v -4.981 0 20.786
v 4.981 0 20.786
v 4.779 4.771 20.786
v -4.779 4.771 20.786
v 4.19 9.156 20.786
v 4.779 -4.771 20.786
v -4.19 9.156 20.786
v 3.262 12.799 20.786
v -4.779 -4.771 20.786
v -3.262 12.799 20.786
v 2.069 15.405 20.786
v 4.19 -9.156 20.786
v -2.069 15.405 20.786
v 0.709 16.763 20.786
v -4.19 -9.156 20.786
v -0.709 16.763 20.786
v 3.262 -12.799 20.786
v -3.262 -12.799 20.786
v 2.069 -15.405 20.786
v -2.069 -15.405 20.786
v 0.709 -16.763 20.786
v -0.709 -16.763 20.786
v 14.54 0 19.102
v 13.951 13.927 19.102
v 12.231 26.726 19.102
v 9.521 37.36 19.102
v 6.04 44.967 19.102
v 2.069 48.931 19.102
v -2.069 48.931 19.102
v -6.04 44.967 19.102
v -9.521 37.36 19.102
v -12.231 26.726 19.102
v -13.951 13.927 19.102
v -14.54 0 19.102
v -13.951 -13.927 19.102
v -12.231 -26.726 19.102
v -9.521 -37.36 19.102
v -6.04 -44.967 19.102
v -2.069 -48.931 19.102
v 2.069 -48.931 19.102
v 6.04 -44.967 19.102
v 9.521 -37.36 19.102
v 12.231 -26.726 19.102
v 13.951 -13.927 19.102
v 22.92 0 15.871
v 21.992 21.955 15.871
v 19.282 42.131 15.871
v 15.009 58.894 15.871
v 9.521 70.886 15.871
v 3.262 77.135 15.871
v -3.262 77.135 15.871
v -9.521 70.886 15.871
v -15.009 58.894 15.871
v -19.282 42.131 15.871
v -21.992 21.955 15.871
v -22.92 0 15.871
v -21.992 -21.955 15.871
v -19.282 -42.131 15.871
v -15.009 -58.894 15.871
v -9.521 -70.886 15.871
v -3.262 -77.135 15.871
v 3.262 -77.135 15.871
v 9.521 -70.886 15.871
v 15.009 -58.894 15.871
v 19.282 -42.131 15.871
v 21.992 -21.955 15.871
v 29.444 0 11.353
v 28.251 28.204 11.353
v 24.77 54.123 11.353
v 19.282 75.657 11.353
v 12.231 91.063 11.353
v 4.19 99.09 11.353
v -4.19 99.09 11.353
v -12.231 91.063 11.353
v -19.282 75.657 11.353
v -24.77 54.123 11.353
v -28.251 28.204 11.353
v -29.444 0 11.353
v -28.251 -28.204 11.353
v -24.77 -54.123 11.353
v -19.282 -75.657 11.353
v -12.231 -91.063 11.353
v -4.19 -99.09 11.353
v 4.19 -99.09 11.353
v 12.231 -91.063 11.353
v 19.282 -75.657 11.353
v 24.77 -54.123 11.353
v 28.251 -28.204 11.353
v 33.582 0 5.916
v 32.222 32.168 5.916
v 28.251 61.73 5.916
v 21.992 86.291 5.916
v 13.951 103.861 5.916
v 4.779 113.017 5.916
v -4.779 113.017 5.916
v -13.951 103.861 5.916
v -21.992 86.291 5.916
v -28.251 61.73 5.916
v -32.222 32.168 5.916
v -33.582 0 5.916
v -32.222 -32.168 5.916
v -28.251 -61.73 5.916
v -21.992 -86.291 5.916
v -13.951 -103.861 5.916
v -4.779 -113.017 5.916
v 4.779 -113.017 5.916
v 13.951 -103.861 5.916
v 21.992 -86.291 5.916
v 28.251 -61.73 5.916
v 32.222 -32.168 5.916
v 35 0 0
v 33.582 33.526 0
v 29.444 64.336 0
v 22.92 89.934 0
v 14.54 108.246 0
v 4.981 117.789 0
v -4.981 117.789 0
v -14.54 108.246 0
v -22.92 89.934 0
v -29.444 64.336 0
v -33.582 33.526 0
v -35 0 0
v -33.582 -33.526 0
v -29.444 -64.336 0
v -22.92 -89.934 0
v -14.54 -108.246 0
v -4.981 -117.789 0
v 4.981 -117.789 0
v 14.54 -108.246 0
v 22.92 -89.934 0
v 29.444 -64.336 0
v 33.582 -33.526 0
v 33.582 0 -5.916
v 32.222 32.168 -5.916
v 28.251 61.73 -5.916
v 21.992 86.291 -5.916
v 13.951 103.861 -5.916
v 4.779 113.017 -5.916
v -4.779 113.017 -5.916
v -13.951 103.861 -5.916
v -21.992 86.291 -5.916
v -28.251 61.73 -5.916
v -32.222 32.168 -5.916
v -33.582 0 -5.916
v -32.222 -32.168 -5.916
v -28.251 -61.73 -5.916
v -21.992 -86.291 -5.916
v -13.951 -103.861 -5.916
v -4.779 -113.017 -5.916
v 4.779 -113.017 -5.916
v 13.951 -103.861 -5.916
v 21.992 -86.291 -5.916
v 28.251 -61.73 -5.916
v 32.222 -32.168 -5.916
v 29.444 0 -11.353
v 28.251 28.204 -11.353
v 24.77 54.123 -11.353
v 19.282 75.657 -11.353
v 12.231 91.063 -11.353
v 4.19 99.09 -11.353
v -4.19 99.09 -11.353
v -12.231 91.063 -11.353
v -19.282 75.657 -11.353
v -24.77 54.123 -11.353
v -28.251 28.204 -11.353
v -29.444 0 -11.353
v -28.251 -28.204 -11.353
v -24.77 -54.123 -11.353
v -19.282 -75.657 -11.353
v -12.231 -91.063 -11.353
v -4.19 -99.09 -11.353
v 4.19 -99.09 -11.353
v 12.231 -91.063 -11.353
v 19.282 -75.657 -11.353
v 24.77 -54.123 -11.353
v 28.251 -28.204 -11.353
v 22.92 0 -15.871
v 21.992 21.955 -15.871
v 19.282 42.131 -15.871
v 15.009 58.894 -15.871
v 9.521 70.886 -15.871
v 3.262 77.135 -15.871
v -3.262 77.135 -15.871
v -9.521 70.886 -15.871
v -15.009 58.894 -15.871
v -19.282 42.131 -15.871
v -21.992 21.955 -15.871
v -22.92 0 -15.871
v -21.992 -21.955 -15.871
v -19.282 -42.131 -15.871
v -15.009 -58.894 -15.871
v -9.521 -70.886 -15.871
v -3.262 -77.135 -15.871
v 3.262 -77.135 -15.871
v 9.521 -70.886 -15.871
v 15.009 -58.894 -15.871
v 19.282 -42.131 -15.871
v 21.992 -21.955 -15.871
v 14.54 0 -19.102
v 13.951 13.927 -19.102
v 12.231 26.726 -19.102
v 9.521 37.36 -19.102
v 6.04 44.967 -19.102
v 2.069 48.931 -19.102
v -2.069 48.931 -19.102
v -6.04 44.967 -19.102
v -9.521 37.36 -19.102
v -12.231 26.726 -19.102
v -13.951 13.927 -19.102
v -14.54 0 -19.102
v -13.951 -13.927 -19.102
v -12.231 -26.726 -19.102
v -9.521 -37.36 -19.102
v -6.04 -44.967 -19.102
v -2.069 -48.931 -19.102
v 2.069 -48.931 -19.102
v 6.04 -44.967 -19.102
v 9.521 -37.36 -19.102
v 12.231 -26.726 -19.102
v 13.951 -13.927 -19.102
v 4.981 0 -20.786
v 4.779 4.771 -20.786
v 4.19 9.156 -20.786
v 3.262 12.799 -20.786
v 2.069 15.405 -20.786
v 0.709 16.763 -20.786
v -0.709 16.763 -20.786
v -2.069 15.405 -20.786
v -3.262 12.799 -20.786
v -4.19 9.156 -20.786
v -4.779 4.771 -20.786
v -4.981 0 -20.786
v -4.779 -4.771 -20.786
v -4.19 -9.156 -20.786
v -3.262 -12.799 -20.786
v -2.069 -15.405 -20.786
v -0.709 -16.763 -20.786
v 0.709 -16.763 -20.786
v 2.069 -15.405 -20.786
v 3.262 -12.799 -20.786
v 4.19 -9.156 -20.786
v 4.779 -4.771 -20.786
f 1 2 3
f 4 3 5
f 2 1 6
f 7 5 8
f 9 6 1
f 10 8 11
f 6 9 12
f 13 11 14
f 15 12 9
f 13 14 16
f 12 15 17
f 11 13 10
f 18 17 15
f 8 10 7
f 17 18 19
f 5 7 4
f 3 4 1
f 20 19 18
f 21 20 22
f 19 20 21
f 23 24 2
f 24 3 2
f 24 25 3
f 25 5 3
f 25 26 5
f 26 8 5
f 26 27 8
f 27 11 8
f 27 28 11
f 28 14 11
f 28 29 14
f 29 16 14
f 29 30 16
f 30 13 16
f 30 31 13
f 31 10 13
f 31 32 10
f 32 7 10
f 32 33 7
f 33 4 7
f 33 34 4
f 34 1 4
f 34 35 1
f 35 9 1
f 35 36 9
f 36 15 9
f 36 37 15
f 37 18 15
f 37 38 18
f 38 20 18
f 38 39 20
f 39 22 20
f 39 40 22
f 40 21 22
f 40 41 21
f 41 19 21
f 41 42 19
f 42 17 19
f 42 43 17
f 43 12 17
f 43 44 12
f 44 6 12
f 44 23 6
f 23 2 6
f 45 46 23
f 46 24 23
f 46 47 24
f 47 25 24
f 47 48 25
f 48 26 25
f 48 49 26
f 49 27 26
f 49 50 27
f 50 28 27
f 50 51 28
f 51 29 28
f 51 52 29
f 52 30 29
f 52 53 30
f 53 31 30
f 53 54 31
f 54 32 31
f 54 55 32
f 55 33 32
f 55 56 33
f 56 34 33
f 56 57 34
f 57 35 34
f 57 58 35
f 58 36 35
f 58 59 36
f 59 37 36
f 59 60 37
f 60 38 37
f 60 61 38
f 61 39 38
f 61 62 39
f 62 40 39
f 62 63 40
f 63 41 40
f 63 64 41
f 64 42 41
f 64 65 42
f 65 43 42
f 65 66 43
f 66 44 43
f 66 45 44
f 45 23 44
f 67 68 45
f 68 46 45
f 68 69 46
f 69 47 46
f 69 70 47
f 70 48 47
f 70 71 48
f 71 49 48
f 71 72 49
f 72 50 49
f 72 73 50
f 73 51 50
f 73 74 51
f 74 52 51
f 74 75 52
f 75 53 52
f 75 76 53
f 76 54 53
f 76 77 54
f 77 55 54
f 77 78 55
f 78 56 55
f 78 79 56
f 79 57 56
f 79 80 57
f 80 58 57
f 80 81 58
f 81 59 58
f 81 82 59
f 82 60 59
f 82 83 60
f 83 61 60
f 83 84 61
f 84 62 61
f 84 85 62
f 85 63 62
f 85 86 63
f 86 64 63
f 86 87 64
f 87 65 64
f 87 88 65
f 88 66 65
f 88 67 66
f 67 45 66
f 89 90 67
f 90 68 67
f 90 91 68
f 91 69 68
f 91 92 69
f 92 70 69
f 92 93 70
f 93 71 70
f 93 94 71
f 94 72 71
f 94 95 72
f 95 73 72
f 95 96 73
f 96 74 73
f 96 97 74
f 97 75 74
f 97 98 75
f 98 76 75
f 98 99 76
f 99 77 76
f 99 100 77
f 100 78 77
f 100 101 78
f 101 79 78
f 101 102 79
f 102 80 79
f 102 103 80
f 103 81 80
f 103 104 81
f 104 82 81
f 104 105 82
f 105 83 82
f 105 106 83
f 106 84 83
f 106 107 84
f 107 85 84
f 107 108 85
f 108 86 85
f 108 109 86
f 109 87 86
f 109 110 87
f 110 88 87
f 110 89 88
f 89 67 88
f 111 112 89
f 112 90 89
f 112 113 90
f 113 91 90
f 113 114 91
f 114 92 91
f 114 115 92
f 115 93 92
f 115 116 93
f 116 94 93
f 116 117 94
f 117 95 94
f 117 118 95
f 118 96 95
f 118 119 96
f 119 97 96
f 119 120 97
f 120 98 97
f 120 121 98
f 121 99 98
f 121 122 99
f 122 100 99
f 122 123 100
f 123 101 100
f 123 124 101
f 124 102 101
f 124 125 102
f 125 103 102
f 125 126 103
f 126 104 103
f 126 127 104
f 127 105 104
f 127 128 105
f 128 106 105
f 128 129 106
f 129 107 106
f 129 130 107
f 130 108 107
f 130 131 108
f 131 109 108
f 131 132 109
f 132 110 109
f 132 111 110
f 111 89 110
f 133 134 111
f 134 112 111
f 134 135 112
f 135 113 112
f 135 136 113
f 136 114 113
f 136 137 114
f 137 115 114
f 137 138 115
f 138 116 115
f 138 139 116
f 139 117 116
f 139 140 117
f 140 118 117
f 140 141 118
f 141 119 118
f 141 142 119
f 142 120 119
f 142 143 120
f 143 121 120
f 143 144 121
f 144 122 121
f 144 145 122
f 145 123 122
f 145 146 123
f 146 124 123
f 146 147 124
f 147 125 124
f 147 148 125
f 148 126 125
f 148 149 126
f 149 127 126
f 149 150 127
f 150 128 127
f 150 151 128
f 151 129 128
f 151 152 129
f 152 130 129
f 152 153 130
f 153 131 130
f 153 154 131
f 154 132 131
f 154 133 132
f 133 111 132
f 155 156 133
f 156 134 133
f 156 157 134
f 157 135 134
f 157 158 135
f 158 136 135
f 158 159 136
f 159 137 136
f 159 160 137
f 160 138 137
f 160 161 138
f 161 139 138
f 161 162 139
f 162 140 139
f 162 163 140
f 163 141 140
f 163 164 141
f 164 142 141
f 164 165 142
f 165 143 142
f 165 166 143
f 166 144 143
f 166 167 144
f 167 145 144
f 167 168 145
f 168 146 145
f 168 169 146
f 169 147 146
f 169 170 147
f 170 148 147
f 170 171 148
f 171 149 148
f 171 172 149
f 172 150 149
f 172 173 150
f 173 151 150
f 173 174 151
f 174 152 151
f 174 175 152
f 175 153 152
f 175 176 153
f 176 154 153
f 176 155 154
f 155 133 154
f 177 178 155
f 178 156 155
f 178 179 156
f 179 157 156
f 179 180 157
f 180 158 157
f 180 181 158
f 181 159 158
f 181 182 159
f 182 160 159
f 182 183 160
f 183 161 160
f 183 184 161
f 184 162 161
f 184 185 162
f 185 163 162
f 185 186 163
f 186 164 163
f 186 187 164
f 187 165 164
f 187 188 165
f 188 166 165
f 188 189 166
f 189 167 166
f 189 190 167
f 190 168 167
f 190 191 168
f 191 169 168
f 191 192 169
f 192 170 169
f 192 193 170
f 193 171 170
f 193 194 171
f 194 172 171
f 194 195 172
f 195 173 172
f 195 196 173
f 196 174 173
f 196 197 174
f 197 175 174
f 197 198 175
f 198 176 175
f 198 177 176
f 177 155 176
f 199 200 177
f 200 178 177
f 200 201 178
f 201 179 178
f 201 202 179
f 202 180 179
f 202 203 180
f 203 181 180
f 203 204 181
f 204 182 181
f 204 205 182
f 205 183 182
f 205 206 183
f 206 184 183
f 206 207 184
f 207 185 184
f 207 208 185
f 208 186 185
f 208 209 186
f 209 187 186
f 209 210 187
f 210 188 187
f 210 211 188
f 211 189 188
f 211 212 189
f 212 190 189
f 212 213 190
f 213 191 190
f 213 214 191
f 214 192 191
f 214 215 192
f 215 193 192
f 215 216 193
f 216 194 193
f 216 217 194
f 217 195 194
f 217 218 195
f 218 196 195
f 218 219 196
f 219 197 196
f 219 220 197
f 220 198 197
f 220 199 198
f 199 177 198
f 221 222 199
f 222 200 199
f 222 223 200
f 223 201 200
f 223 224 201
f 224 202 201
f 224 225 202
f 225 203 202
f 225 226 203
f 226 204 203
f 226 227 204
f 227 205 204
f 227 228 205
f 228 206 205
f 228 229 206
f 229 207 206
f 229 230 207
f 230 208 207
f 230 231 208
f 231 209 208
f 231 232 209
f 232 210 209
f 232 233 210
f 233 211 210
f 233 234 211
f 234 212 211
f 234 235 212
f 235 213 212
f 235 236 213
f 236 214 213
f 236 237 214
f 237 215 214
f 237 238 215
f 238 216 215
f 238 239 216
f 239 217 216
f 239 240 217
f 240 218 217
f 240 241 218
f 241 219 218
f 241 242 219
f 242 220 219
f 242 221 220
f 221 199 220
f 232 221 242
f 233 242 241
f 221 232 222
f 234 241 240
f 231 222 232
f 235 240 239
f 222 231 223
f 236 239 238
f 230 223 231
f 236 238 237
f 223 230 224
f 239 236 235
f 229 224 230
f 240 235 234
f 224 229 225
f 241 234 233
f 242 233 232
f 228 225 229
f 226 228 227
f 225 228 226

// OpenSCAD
// Generated by SolidPython 1.0.1 on 2020-07-29 00:46:46


scale(v = [5, 17, 3]) {
	sphere(r = 7);
}
/***********************************************
*********      SolidPython code:      **********
************************************************
 
# import packages: SolidPython
from solid import *
from solid.utils import *
from itertools import chain, combinations, permutations


class Resize:

    def __init__(self, scad_file):
        self.scad_file = scad_file
        #self.scad_file = import_scad(scad_file)
        # cone/cylinder param:
        self.r1 = 0
        self.r2 = 0
        self.h = 0
        # rectangular prism param:
        self.w = 0
        self.l = 0
        # ellipse param:
        self.r = 0

    # import OpenScad code (file name corresponds to shape)


    # classify shape + parameters
    def assign(self, param1, param2, param3):
        if self.scad_file == 'cone.scad':
            self.r1 = param1
            self.r2 = param2
            self.h = param3
        elif self.scad_file == 'cylinder.scad':
            self.r1 = param1
            self.r2 = param2
            self.h = param3
        elif self.scad_file == 'rectangularPrism.scad':
            self.h = param1
            self.l = param2
            self.w = param3
        else:
            self.r = param1
            self.h = param2

    # resize parameters
    def iterate(self):
        x = range(3, 20, 2)
        i = 1
        if self.scad_file == 'cone.scad':
            tempList = list(permutations(x, 2))
            for temp in tempList:
                param1 = temp[0]
                param2 = temp[1]
                filepath = 'produced_scad_files/' + 'cone' + str(param1) + '_' + str(param2) + '_' + '.scad'
                scad_render_to_file(cylinder(h=param1, r1=param2, r2=0), filepath)

        elif self.scad_file == 'cylinder.scad':
            tempList = list(permutations(x, 3))
            for temp in tempList:
                param1 = temp[0]
                param2 = temp[1]
                filepath = 'produced_scad_files/' + 'cylinder' + str(param1) + '_' + str(param2) + '_' + '.scad'
                scad_render_to_file(cylinder(h=param1, r1=param2, r2=param2), filepath)

        elif self.scad_file == 'rectangularPrism.scad':
            tempList = list(permutations(x, 3))
            for temp in tempList:
                param1 = temp[0]
                param2 = temp[1]
                param3 = temp[2]
                filepath = 'produced_scad_files/' + 'rectangularPrism' + str(param1) + '_' + str(param2) + '_' + str(
                    param3) + '.scad'
                scad_render_to_file(cube(size=(param1, param2, param3)), filepath)

        elif self.scad_file == 'ellipse.scad':
            tempList = list(permutations(x, 4))
            for temp in tempList:
                param1 = temp[0]
                param2 = temp[1]
                param3 = temp[2]
                param4 = temp[3]
                filepath = 'produced_scad_files/' + 'ellipse' + str(param1) + '_' + str(param2) + '_' + str(param3) + '_' + str(param4) + '.scad'
                scad_render_to_file(scale([param1, param2, param3])(sphere(r=param4)), filepath)

    def render_to_scadfile(self):
        scad_render_to_file(scad, 'example.scad') 
 
************************************************/
